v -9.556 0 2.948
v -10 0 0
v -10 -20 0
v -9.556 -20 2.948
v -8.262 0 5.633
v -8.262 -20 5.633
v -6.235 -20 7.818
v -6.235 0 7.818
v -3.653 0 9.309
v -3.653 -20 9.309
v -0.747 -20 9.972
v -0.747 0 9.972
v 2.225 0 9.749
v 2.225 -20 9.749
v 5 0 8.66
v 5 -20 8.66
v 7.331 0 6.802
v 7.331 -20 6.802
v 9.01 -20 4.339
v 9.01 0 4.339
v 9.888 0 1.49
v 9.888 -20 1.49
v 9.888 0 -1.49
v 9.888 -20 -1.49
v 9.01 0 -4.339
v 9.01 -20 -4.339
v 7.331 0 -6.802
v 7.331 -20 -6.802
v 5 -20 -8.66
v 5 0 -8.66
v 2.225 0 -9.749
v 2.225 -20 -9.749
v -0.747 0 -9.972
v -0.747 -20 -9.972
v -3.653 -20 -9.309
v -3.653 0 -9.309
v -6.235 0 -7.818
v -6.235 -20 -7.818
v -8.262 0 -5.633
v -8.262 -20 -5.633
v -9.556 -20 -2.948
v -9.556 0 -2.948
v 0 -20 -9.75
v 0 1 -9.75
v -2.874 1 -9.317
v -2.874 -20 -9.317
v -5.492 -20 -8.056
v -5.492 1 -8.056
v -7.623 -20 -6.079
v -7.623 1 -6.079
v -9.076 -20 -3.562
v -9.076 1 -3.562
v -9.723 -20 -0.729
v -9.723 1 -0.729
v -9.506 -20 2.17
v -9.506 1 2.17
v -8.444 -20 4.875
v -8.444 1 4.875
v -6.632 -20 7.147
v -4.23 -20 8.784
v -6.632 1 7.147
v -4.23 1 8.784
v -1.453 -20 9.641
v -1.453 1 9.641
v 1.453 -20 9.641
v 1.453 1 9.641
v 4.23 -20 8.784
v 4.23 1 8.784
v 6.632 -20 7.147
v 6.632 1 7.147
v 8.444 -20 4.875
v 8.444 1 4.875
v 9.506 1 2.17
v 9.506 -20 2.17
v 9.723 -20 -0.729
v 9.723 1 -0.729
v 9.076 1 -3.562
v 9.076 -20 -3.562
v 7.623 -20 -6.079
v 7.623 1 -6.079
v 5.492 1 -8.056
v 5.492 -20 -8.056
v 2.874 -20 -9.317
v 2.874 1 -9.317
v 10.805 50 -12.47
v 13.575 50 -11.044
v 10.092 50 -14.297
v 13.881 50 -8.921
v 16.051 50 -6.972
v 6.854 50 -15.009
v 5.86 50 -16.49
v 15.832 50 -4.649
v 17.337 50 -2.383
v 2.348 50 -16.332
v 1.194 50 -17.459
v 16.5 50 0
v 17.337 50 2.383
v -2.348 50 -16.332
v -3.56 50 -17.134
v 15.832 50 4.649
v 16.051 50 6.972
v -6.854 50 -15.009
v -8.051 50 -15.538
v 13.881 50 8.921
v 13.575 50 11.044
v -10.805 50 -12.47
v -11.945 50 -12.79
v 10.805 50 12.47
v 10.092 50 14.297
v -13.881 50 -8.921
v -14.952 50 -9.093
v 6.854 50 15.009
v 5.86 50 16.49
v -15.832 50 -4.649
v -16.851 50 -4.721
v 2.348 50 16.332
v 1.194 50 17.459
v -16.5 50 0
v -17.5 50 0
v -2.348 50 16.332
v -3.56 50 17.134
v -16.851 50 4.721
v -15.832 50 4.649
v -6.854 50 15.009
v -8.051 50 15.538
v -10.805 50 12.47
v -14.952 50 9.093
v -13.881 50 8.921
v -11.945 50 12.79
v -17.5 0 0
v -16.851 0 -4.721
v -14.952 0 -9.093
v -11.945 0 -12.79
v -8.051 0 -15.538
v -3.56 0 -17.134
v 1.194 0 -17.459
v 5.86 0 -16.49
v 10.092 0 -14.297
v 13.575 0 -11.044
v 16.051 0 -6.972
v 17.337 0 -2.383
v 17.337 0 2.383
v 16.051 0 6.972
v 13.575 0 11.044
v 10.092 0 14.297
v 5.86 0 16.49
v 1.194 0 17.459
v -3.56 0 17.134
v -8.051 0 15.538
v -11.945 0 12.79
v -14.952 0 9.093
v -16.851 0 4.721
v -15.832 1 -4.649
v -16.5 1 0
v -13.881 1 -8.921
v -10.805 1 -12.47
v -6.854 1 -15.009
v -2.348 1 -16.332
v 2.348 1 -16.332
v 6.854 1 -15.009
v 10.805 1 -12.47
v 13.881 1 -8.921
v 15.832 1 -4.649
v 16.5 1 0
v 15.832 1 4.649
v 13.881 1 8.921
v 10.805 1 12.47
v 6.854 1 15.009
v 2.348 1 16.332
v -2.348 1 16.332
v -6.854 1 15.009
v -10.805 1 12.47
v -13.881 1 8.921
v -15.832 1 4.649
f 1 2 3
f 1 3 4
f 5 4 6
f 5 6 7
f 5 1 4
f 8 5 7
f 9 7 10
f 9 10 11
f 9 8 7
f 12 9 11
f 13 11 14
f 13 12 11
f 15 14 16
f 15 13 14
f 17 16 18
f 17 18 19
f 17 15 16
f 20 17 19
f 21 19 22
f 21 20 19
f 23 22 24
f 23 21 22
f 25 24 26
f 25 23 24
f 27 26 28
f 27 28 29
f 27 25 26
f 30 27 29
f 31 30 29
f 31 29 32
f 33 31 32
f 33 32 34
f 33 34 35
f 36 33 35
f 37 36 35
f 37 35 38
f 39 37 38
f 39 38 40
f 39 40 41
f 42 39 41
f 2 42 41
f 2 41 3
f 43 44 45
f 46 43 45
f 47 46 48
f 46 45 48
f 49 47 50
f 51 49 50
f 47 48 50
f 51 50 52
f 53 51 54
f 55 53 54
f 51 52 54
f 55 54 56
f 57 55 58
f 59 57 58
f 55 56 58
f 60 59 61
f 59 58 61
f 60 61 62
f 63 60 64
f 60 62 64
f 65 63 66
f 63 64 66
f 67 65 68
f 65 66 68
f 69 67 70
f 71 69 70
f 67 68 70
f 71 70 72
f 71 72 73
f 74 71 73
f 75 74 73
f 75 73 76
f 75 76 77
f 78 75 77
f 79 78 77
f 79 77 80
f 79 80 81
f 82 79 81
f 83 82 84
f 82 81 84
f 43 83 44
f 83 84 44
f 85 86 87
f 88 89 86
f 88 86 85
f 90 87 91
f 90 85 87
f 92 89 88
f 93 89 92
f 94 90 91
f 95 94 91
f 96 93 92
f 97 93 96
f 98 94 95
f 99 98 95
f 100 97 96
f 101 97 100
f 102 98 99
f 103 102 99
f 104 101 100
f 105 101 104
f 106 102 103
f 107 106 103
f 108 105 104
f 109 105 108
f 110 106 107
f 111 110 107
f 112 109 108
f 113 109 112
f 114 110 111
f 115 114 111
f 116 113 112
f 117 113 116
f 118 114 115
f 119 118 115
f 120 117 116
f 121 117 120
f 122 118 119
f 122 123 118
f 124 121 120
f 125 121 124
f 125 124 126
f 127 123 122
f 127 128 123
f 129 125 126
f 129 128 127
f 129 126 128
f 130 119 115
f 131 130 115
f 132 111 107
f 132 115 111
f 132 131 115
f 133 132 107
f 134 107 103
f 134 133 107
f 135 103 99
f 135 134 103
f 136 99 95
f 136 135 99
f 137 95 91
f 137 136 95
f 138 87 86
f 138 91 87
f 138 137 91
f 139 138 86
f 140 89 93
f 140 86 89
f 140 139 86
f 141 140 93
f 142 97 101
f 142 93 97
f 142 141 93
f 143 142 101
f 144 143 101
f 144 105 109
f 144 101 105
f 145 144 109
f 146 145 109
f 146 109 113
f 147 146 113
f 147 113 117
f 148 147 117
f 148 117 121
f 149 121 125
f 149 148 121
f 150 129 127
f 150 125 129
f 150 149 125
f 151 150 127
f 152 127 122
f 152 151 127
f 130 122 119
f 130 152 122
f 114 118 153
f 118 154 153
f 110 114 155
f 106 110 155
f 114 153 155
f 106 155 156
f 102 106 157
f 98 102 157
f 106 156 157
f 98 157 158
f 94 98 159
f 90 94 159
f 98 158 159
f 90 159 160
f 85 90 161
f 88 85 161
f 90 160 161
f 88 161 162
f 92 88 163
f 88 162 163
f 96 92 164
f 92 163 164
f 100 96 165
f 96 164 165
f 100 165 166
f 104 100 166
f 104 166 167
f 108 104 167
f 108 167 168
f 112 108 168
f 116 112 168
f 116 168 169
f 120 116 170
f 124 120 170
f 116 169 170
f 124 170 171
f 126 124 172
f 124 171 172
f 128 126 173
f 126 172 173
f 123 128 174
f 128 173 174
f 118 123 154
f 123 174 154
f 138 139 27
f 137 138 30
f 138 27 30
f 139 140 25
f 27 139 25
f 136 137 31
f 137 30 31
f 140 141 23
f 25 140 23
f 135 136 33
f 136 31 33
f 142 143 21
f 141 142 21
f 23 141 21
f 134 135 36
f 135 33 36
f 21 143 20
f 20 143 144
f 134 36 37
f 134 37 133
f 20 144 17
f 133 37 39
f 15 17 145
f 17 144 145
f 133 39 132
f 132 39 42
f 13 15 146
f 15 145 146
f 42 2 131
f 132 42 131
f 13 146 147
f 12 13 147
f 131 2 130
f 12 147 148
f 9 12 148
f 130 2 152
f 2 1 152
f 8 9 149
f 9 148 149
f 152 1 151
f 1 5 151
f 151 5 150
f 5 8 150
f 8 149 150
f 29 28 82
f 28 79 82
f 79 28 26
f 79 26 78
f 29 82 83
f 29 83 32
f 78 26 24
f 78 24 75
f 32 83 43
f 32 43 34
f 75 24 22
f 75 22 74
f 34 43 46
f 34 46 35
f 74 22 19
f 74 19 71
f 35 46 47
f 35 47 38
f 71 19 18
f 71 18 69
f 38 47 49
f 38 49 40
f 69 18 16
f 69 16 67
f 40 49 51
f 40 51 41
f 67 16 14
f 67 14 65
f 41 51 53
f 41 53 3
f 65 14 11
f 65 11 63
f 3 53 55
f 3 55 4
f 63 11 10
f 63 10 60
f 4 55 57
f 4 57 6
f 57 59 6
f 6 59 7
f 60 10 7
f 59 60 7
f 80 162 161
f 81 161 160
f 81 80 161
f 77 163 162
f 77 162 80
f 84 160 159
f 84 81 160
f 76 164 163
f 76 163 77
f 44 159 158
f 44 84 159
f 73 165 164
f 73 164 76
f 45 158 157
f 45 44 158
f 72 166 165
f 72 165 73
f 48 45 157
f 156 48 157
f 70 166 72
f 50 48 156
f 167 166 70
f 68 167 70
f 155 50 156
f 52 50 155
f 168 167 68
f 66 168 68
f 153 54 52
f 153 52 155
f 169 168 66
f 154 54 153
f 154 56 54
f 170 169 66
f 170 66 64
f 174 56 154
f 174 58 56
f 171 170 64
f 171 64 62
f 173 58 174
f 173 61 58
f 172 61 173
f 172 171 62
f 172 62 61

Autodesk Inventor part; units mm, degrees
ref_plane "YZ Plane" through (0, 0, 0) normal (1, 0, 0) x (0, 1, 0)
ref_plane "XZ Plane" through (0, 0, 0) normal (0, 1, 0) x (-1, 0, 0)
ref_plane "XY Plane" through (0, 0, 0) normal (0, 0, 1) x (1, 0, 0)
sketch "Sketch1" plane through (0, 0, 0) normal (0, 1, 0) x (-1, 0, 0)
  circle A0 centre (0, 0) radius 17.5
  circle A1 centre (0, 0) radius 10
  dimension "d0" = 35
  dimension "d1" = 20
extrude "Extrusion1" add sketch "Sketch1" along normal blind 50 contours A0 | A1
extrude "Extrusion2" add sketch "Sketch1" against normal blind 20 contours A1
shell "Shell1" thickness 1 removed faces 1 at (-4.3663, 50, -1.0762)
sketch "Sketch2" plane through (0, -20, 0) normal (0, -1, 0) x (1, 0, 0)
  point P0 (0, 0)
  point P1 (0, 0)
hole "Hole1" at (0, -20, 0) direction (0, 1, 0) diameter 19.5 depth 50
properties part number "new seed container"
